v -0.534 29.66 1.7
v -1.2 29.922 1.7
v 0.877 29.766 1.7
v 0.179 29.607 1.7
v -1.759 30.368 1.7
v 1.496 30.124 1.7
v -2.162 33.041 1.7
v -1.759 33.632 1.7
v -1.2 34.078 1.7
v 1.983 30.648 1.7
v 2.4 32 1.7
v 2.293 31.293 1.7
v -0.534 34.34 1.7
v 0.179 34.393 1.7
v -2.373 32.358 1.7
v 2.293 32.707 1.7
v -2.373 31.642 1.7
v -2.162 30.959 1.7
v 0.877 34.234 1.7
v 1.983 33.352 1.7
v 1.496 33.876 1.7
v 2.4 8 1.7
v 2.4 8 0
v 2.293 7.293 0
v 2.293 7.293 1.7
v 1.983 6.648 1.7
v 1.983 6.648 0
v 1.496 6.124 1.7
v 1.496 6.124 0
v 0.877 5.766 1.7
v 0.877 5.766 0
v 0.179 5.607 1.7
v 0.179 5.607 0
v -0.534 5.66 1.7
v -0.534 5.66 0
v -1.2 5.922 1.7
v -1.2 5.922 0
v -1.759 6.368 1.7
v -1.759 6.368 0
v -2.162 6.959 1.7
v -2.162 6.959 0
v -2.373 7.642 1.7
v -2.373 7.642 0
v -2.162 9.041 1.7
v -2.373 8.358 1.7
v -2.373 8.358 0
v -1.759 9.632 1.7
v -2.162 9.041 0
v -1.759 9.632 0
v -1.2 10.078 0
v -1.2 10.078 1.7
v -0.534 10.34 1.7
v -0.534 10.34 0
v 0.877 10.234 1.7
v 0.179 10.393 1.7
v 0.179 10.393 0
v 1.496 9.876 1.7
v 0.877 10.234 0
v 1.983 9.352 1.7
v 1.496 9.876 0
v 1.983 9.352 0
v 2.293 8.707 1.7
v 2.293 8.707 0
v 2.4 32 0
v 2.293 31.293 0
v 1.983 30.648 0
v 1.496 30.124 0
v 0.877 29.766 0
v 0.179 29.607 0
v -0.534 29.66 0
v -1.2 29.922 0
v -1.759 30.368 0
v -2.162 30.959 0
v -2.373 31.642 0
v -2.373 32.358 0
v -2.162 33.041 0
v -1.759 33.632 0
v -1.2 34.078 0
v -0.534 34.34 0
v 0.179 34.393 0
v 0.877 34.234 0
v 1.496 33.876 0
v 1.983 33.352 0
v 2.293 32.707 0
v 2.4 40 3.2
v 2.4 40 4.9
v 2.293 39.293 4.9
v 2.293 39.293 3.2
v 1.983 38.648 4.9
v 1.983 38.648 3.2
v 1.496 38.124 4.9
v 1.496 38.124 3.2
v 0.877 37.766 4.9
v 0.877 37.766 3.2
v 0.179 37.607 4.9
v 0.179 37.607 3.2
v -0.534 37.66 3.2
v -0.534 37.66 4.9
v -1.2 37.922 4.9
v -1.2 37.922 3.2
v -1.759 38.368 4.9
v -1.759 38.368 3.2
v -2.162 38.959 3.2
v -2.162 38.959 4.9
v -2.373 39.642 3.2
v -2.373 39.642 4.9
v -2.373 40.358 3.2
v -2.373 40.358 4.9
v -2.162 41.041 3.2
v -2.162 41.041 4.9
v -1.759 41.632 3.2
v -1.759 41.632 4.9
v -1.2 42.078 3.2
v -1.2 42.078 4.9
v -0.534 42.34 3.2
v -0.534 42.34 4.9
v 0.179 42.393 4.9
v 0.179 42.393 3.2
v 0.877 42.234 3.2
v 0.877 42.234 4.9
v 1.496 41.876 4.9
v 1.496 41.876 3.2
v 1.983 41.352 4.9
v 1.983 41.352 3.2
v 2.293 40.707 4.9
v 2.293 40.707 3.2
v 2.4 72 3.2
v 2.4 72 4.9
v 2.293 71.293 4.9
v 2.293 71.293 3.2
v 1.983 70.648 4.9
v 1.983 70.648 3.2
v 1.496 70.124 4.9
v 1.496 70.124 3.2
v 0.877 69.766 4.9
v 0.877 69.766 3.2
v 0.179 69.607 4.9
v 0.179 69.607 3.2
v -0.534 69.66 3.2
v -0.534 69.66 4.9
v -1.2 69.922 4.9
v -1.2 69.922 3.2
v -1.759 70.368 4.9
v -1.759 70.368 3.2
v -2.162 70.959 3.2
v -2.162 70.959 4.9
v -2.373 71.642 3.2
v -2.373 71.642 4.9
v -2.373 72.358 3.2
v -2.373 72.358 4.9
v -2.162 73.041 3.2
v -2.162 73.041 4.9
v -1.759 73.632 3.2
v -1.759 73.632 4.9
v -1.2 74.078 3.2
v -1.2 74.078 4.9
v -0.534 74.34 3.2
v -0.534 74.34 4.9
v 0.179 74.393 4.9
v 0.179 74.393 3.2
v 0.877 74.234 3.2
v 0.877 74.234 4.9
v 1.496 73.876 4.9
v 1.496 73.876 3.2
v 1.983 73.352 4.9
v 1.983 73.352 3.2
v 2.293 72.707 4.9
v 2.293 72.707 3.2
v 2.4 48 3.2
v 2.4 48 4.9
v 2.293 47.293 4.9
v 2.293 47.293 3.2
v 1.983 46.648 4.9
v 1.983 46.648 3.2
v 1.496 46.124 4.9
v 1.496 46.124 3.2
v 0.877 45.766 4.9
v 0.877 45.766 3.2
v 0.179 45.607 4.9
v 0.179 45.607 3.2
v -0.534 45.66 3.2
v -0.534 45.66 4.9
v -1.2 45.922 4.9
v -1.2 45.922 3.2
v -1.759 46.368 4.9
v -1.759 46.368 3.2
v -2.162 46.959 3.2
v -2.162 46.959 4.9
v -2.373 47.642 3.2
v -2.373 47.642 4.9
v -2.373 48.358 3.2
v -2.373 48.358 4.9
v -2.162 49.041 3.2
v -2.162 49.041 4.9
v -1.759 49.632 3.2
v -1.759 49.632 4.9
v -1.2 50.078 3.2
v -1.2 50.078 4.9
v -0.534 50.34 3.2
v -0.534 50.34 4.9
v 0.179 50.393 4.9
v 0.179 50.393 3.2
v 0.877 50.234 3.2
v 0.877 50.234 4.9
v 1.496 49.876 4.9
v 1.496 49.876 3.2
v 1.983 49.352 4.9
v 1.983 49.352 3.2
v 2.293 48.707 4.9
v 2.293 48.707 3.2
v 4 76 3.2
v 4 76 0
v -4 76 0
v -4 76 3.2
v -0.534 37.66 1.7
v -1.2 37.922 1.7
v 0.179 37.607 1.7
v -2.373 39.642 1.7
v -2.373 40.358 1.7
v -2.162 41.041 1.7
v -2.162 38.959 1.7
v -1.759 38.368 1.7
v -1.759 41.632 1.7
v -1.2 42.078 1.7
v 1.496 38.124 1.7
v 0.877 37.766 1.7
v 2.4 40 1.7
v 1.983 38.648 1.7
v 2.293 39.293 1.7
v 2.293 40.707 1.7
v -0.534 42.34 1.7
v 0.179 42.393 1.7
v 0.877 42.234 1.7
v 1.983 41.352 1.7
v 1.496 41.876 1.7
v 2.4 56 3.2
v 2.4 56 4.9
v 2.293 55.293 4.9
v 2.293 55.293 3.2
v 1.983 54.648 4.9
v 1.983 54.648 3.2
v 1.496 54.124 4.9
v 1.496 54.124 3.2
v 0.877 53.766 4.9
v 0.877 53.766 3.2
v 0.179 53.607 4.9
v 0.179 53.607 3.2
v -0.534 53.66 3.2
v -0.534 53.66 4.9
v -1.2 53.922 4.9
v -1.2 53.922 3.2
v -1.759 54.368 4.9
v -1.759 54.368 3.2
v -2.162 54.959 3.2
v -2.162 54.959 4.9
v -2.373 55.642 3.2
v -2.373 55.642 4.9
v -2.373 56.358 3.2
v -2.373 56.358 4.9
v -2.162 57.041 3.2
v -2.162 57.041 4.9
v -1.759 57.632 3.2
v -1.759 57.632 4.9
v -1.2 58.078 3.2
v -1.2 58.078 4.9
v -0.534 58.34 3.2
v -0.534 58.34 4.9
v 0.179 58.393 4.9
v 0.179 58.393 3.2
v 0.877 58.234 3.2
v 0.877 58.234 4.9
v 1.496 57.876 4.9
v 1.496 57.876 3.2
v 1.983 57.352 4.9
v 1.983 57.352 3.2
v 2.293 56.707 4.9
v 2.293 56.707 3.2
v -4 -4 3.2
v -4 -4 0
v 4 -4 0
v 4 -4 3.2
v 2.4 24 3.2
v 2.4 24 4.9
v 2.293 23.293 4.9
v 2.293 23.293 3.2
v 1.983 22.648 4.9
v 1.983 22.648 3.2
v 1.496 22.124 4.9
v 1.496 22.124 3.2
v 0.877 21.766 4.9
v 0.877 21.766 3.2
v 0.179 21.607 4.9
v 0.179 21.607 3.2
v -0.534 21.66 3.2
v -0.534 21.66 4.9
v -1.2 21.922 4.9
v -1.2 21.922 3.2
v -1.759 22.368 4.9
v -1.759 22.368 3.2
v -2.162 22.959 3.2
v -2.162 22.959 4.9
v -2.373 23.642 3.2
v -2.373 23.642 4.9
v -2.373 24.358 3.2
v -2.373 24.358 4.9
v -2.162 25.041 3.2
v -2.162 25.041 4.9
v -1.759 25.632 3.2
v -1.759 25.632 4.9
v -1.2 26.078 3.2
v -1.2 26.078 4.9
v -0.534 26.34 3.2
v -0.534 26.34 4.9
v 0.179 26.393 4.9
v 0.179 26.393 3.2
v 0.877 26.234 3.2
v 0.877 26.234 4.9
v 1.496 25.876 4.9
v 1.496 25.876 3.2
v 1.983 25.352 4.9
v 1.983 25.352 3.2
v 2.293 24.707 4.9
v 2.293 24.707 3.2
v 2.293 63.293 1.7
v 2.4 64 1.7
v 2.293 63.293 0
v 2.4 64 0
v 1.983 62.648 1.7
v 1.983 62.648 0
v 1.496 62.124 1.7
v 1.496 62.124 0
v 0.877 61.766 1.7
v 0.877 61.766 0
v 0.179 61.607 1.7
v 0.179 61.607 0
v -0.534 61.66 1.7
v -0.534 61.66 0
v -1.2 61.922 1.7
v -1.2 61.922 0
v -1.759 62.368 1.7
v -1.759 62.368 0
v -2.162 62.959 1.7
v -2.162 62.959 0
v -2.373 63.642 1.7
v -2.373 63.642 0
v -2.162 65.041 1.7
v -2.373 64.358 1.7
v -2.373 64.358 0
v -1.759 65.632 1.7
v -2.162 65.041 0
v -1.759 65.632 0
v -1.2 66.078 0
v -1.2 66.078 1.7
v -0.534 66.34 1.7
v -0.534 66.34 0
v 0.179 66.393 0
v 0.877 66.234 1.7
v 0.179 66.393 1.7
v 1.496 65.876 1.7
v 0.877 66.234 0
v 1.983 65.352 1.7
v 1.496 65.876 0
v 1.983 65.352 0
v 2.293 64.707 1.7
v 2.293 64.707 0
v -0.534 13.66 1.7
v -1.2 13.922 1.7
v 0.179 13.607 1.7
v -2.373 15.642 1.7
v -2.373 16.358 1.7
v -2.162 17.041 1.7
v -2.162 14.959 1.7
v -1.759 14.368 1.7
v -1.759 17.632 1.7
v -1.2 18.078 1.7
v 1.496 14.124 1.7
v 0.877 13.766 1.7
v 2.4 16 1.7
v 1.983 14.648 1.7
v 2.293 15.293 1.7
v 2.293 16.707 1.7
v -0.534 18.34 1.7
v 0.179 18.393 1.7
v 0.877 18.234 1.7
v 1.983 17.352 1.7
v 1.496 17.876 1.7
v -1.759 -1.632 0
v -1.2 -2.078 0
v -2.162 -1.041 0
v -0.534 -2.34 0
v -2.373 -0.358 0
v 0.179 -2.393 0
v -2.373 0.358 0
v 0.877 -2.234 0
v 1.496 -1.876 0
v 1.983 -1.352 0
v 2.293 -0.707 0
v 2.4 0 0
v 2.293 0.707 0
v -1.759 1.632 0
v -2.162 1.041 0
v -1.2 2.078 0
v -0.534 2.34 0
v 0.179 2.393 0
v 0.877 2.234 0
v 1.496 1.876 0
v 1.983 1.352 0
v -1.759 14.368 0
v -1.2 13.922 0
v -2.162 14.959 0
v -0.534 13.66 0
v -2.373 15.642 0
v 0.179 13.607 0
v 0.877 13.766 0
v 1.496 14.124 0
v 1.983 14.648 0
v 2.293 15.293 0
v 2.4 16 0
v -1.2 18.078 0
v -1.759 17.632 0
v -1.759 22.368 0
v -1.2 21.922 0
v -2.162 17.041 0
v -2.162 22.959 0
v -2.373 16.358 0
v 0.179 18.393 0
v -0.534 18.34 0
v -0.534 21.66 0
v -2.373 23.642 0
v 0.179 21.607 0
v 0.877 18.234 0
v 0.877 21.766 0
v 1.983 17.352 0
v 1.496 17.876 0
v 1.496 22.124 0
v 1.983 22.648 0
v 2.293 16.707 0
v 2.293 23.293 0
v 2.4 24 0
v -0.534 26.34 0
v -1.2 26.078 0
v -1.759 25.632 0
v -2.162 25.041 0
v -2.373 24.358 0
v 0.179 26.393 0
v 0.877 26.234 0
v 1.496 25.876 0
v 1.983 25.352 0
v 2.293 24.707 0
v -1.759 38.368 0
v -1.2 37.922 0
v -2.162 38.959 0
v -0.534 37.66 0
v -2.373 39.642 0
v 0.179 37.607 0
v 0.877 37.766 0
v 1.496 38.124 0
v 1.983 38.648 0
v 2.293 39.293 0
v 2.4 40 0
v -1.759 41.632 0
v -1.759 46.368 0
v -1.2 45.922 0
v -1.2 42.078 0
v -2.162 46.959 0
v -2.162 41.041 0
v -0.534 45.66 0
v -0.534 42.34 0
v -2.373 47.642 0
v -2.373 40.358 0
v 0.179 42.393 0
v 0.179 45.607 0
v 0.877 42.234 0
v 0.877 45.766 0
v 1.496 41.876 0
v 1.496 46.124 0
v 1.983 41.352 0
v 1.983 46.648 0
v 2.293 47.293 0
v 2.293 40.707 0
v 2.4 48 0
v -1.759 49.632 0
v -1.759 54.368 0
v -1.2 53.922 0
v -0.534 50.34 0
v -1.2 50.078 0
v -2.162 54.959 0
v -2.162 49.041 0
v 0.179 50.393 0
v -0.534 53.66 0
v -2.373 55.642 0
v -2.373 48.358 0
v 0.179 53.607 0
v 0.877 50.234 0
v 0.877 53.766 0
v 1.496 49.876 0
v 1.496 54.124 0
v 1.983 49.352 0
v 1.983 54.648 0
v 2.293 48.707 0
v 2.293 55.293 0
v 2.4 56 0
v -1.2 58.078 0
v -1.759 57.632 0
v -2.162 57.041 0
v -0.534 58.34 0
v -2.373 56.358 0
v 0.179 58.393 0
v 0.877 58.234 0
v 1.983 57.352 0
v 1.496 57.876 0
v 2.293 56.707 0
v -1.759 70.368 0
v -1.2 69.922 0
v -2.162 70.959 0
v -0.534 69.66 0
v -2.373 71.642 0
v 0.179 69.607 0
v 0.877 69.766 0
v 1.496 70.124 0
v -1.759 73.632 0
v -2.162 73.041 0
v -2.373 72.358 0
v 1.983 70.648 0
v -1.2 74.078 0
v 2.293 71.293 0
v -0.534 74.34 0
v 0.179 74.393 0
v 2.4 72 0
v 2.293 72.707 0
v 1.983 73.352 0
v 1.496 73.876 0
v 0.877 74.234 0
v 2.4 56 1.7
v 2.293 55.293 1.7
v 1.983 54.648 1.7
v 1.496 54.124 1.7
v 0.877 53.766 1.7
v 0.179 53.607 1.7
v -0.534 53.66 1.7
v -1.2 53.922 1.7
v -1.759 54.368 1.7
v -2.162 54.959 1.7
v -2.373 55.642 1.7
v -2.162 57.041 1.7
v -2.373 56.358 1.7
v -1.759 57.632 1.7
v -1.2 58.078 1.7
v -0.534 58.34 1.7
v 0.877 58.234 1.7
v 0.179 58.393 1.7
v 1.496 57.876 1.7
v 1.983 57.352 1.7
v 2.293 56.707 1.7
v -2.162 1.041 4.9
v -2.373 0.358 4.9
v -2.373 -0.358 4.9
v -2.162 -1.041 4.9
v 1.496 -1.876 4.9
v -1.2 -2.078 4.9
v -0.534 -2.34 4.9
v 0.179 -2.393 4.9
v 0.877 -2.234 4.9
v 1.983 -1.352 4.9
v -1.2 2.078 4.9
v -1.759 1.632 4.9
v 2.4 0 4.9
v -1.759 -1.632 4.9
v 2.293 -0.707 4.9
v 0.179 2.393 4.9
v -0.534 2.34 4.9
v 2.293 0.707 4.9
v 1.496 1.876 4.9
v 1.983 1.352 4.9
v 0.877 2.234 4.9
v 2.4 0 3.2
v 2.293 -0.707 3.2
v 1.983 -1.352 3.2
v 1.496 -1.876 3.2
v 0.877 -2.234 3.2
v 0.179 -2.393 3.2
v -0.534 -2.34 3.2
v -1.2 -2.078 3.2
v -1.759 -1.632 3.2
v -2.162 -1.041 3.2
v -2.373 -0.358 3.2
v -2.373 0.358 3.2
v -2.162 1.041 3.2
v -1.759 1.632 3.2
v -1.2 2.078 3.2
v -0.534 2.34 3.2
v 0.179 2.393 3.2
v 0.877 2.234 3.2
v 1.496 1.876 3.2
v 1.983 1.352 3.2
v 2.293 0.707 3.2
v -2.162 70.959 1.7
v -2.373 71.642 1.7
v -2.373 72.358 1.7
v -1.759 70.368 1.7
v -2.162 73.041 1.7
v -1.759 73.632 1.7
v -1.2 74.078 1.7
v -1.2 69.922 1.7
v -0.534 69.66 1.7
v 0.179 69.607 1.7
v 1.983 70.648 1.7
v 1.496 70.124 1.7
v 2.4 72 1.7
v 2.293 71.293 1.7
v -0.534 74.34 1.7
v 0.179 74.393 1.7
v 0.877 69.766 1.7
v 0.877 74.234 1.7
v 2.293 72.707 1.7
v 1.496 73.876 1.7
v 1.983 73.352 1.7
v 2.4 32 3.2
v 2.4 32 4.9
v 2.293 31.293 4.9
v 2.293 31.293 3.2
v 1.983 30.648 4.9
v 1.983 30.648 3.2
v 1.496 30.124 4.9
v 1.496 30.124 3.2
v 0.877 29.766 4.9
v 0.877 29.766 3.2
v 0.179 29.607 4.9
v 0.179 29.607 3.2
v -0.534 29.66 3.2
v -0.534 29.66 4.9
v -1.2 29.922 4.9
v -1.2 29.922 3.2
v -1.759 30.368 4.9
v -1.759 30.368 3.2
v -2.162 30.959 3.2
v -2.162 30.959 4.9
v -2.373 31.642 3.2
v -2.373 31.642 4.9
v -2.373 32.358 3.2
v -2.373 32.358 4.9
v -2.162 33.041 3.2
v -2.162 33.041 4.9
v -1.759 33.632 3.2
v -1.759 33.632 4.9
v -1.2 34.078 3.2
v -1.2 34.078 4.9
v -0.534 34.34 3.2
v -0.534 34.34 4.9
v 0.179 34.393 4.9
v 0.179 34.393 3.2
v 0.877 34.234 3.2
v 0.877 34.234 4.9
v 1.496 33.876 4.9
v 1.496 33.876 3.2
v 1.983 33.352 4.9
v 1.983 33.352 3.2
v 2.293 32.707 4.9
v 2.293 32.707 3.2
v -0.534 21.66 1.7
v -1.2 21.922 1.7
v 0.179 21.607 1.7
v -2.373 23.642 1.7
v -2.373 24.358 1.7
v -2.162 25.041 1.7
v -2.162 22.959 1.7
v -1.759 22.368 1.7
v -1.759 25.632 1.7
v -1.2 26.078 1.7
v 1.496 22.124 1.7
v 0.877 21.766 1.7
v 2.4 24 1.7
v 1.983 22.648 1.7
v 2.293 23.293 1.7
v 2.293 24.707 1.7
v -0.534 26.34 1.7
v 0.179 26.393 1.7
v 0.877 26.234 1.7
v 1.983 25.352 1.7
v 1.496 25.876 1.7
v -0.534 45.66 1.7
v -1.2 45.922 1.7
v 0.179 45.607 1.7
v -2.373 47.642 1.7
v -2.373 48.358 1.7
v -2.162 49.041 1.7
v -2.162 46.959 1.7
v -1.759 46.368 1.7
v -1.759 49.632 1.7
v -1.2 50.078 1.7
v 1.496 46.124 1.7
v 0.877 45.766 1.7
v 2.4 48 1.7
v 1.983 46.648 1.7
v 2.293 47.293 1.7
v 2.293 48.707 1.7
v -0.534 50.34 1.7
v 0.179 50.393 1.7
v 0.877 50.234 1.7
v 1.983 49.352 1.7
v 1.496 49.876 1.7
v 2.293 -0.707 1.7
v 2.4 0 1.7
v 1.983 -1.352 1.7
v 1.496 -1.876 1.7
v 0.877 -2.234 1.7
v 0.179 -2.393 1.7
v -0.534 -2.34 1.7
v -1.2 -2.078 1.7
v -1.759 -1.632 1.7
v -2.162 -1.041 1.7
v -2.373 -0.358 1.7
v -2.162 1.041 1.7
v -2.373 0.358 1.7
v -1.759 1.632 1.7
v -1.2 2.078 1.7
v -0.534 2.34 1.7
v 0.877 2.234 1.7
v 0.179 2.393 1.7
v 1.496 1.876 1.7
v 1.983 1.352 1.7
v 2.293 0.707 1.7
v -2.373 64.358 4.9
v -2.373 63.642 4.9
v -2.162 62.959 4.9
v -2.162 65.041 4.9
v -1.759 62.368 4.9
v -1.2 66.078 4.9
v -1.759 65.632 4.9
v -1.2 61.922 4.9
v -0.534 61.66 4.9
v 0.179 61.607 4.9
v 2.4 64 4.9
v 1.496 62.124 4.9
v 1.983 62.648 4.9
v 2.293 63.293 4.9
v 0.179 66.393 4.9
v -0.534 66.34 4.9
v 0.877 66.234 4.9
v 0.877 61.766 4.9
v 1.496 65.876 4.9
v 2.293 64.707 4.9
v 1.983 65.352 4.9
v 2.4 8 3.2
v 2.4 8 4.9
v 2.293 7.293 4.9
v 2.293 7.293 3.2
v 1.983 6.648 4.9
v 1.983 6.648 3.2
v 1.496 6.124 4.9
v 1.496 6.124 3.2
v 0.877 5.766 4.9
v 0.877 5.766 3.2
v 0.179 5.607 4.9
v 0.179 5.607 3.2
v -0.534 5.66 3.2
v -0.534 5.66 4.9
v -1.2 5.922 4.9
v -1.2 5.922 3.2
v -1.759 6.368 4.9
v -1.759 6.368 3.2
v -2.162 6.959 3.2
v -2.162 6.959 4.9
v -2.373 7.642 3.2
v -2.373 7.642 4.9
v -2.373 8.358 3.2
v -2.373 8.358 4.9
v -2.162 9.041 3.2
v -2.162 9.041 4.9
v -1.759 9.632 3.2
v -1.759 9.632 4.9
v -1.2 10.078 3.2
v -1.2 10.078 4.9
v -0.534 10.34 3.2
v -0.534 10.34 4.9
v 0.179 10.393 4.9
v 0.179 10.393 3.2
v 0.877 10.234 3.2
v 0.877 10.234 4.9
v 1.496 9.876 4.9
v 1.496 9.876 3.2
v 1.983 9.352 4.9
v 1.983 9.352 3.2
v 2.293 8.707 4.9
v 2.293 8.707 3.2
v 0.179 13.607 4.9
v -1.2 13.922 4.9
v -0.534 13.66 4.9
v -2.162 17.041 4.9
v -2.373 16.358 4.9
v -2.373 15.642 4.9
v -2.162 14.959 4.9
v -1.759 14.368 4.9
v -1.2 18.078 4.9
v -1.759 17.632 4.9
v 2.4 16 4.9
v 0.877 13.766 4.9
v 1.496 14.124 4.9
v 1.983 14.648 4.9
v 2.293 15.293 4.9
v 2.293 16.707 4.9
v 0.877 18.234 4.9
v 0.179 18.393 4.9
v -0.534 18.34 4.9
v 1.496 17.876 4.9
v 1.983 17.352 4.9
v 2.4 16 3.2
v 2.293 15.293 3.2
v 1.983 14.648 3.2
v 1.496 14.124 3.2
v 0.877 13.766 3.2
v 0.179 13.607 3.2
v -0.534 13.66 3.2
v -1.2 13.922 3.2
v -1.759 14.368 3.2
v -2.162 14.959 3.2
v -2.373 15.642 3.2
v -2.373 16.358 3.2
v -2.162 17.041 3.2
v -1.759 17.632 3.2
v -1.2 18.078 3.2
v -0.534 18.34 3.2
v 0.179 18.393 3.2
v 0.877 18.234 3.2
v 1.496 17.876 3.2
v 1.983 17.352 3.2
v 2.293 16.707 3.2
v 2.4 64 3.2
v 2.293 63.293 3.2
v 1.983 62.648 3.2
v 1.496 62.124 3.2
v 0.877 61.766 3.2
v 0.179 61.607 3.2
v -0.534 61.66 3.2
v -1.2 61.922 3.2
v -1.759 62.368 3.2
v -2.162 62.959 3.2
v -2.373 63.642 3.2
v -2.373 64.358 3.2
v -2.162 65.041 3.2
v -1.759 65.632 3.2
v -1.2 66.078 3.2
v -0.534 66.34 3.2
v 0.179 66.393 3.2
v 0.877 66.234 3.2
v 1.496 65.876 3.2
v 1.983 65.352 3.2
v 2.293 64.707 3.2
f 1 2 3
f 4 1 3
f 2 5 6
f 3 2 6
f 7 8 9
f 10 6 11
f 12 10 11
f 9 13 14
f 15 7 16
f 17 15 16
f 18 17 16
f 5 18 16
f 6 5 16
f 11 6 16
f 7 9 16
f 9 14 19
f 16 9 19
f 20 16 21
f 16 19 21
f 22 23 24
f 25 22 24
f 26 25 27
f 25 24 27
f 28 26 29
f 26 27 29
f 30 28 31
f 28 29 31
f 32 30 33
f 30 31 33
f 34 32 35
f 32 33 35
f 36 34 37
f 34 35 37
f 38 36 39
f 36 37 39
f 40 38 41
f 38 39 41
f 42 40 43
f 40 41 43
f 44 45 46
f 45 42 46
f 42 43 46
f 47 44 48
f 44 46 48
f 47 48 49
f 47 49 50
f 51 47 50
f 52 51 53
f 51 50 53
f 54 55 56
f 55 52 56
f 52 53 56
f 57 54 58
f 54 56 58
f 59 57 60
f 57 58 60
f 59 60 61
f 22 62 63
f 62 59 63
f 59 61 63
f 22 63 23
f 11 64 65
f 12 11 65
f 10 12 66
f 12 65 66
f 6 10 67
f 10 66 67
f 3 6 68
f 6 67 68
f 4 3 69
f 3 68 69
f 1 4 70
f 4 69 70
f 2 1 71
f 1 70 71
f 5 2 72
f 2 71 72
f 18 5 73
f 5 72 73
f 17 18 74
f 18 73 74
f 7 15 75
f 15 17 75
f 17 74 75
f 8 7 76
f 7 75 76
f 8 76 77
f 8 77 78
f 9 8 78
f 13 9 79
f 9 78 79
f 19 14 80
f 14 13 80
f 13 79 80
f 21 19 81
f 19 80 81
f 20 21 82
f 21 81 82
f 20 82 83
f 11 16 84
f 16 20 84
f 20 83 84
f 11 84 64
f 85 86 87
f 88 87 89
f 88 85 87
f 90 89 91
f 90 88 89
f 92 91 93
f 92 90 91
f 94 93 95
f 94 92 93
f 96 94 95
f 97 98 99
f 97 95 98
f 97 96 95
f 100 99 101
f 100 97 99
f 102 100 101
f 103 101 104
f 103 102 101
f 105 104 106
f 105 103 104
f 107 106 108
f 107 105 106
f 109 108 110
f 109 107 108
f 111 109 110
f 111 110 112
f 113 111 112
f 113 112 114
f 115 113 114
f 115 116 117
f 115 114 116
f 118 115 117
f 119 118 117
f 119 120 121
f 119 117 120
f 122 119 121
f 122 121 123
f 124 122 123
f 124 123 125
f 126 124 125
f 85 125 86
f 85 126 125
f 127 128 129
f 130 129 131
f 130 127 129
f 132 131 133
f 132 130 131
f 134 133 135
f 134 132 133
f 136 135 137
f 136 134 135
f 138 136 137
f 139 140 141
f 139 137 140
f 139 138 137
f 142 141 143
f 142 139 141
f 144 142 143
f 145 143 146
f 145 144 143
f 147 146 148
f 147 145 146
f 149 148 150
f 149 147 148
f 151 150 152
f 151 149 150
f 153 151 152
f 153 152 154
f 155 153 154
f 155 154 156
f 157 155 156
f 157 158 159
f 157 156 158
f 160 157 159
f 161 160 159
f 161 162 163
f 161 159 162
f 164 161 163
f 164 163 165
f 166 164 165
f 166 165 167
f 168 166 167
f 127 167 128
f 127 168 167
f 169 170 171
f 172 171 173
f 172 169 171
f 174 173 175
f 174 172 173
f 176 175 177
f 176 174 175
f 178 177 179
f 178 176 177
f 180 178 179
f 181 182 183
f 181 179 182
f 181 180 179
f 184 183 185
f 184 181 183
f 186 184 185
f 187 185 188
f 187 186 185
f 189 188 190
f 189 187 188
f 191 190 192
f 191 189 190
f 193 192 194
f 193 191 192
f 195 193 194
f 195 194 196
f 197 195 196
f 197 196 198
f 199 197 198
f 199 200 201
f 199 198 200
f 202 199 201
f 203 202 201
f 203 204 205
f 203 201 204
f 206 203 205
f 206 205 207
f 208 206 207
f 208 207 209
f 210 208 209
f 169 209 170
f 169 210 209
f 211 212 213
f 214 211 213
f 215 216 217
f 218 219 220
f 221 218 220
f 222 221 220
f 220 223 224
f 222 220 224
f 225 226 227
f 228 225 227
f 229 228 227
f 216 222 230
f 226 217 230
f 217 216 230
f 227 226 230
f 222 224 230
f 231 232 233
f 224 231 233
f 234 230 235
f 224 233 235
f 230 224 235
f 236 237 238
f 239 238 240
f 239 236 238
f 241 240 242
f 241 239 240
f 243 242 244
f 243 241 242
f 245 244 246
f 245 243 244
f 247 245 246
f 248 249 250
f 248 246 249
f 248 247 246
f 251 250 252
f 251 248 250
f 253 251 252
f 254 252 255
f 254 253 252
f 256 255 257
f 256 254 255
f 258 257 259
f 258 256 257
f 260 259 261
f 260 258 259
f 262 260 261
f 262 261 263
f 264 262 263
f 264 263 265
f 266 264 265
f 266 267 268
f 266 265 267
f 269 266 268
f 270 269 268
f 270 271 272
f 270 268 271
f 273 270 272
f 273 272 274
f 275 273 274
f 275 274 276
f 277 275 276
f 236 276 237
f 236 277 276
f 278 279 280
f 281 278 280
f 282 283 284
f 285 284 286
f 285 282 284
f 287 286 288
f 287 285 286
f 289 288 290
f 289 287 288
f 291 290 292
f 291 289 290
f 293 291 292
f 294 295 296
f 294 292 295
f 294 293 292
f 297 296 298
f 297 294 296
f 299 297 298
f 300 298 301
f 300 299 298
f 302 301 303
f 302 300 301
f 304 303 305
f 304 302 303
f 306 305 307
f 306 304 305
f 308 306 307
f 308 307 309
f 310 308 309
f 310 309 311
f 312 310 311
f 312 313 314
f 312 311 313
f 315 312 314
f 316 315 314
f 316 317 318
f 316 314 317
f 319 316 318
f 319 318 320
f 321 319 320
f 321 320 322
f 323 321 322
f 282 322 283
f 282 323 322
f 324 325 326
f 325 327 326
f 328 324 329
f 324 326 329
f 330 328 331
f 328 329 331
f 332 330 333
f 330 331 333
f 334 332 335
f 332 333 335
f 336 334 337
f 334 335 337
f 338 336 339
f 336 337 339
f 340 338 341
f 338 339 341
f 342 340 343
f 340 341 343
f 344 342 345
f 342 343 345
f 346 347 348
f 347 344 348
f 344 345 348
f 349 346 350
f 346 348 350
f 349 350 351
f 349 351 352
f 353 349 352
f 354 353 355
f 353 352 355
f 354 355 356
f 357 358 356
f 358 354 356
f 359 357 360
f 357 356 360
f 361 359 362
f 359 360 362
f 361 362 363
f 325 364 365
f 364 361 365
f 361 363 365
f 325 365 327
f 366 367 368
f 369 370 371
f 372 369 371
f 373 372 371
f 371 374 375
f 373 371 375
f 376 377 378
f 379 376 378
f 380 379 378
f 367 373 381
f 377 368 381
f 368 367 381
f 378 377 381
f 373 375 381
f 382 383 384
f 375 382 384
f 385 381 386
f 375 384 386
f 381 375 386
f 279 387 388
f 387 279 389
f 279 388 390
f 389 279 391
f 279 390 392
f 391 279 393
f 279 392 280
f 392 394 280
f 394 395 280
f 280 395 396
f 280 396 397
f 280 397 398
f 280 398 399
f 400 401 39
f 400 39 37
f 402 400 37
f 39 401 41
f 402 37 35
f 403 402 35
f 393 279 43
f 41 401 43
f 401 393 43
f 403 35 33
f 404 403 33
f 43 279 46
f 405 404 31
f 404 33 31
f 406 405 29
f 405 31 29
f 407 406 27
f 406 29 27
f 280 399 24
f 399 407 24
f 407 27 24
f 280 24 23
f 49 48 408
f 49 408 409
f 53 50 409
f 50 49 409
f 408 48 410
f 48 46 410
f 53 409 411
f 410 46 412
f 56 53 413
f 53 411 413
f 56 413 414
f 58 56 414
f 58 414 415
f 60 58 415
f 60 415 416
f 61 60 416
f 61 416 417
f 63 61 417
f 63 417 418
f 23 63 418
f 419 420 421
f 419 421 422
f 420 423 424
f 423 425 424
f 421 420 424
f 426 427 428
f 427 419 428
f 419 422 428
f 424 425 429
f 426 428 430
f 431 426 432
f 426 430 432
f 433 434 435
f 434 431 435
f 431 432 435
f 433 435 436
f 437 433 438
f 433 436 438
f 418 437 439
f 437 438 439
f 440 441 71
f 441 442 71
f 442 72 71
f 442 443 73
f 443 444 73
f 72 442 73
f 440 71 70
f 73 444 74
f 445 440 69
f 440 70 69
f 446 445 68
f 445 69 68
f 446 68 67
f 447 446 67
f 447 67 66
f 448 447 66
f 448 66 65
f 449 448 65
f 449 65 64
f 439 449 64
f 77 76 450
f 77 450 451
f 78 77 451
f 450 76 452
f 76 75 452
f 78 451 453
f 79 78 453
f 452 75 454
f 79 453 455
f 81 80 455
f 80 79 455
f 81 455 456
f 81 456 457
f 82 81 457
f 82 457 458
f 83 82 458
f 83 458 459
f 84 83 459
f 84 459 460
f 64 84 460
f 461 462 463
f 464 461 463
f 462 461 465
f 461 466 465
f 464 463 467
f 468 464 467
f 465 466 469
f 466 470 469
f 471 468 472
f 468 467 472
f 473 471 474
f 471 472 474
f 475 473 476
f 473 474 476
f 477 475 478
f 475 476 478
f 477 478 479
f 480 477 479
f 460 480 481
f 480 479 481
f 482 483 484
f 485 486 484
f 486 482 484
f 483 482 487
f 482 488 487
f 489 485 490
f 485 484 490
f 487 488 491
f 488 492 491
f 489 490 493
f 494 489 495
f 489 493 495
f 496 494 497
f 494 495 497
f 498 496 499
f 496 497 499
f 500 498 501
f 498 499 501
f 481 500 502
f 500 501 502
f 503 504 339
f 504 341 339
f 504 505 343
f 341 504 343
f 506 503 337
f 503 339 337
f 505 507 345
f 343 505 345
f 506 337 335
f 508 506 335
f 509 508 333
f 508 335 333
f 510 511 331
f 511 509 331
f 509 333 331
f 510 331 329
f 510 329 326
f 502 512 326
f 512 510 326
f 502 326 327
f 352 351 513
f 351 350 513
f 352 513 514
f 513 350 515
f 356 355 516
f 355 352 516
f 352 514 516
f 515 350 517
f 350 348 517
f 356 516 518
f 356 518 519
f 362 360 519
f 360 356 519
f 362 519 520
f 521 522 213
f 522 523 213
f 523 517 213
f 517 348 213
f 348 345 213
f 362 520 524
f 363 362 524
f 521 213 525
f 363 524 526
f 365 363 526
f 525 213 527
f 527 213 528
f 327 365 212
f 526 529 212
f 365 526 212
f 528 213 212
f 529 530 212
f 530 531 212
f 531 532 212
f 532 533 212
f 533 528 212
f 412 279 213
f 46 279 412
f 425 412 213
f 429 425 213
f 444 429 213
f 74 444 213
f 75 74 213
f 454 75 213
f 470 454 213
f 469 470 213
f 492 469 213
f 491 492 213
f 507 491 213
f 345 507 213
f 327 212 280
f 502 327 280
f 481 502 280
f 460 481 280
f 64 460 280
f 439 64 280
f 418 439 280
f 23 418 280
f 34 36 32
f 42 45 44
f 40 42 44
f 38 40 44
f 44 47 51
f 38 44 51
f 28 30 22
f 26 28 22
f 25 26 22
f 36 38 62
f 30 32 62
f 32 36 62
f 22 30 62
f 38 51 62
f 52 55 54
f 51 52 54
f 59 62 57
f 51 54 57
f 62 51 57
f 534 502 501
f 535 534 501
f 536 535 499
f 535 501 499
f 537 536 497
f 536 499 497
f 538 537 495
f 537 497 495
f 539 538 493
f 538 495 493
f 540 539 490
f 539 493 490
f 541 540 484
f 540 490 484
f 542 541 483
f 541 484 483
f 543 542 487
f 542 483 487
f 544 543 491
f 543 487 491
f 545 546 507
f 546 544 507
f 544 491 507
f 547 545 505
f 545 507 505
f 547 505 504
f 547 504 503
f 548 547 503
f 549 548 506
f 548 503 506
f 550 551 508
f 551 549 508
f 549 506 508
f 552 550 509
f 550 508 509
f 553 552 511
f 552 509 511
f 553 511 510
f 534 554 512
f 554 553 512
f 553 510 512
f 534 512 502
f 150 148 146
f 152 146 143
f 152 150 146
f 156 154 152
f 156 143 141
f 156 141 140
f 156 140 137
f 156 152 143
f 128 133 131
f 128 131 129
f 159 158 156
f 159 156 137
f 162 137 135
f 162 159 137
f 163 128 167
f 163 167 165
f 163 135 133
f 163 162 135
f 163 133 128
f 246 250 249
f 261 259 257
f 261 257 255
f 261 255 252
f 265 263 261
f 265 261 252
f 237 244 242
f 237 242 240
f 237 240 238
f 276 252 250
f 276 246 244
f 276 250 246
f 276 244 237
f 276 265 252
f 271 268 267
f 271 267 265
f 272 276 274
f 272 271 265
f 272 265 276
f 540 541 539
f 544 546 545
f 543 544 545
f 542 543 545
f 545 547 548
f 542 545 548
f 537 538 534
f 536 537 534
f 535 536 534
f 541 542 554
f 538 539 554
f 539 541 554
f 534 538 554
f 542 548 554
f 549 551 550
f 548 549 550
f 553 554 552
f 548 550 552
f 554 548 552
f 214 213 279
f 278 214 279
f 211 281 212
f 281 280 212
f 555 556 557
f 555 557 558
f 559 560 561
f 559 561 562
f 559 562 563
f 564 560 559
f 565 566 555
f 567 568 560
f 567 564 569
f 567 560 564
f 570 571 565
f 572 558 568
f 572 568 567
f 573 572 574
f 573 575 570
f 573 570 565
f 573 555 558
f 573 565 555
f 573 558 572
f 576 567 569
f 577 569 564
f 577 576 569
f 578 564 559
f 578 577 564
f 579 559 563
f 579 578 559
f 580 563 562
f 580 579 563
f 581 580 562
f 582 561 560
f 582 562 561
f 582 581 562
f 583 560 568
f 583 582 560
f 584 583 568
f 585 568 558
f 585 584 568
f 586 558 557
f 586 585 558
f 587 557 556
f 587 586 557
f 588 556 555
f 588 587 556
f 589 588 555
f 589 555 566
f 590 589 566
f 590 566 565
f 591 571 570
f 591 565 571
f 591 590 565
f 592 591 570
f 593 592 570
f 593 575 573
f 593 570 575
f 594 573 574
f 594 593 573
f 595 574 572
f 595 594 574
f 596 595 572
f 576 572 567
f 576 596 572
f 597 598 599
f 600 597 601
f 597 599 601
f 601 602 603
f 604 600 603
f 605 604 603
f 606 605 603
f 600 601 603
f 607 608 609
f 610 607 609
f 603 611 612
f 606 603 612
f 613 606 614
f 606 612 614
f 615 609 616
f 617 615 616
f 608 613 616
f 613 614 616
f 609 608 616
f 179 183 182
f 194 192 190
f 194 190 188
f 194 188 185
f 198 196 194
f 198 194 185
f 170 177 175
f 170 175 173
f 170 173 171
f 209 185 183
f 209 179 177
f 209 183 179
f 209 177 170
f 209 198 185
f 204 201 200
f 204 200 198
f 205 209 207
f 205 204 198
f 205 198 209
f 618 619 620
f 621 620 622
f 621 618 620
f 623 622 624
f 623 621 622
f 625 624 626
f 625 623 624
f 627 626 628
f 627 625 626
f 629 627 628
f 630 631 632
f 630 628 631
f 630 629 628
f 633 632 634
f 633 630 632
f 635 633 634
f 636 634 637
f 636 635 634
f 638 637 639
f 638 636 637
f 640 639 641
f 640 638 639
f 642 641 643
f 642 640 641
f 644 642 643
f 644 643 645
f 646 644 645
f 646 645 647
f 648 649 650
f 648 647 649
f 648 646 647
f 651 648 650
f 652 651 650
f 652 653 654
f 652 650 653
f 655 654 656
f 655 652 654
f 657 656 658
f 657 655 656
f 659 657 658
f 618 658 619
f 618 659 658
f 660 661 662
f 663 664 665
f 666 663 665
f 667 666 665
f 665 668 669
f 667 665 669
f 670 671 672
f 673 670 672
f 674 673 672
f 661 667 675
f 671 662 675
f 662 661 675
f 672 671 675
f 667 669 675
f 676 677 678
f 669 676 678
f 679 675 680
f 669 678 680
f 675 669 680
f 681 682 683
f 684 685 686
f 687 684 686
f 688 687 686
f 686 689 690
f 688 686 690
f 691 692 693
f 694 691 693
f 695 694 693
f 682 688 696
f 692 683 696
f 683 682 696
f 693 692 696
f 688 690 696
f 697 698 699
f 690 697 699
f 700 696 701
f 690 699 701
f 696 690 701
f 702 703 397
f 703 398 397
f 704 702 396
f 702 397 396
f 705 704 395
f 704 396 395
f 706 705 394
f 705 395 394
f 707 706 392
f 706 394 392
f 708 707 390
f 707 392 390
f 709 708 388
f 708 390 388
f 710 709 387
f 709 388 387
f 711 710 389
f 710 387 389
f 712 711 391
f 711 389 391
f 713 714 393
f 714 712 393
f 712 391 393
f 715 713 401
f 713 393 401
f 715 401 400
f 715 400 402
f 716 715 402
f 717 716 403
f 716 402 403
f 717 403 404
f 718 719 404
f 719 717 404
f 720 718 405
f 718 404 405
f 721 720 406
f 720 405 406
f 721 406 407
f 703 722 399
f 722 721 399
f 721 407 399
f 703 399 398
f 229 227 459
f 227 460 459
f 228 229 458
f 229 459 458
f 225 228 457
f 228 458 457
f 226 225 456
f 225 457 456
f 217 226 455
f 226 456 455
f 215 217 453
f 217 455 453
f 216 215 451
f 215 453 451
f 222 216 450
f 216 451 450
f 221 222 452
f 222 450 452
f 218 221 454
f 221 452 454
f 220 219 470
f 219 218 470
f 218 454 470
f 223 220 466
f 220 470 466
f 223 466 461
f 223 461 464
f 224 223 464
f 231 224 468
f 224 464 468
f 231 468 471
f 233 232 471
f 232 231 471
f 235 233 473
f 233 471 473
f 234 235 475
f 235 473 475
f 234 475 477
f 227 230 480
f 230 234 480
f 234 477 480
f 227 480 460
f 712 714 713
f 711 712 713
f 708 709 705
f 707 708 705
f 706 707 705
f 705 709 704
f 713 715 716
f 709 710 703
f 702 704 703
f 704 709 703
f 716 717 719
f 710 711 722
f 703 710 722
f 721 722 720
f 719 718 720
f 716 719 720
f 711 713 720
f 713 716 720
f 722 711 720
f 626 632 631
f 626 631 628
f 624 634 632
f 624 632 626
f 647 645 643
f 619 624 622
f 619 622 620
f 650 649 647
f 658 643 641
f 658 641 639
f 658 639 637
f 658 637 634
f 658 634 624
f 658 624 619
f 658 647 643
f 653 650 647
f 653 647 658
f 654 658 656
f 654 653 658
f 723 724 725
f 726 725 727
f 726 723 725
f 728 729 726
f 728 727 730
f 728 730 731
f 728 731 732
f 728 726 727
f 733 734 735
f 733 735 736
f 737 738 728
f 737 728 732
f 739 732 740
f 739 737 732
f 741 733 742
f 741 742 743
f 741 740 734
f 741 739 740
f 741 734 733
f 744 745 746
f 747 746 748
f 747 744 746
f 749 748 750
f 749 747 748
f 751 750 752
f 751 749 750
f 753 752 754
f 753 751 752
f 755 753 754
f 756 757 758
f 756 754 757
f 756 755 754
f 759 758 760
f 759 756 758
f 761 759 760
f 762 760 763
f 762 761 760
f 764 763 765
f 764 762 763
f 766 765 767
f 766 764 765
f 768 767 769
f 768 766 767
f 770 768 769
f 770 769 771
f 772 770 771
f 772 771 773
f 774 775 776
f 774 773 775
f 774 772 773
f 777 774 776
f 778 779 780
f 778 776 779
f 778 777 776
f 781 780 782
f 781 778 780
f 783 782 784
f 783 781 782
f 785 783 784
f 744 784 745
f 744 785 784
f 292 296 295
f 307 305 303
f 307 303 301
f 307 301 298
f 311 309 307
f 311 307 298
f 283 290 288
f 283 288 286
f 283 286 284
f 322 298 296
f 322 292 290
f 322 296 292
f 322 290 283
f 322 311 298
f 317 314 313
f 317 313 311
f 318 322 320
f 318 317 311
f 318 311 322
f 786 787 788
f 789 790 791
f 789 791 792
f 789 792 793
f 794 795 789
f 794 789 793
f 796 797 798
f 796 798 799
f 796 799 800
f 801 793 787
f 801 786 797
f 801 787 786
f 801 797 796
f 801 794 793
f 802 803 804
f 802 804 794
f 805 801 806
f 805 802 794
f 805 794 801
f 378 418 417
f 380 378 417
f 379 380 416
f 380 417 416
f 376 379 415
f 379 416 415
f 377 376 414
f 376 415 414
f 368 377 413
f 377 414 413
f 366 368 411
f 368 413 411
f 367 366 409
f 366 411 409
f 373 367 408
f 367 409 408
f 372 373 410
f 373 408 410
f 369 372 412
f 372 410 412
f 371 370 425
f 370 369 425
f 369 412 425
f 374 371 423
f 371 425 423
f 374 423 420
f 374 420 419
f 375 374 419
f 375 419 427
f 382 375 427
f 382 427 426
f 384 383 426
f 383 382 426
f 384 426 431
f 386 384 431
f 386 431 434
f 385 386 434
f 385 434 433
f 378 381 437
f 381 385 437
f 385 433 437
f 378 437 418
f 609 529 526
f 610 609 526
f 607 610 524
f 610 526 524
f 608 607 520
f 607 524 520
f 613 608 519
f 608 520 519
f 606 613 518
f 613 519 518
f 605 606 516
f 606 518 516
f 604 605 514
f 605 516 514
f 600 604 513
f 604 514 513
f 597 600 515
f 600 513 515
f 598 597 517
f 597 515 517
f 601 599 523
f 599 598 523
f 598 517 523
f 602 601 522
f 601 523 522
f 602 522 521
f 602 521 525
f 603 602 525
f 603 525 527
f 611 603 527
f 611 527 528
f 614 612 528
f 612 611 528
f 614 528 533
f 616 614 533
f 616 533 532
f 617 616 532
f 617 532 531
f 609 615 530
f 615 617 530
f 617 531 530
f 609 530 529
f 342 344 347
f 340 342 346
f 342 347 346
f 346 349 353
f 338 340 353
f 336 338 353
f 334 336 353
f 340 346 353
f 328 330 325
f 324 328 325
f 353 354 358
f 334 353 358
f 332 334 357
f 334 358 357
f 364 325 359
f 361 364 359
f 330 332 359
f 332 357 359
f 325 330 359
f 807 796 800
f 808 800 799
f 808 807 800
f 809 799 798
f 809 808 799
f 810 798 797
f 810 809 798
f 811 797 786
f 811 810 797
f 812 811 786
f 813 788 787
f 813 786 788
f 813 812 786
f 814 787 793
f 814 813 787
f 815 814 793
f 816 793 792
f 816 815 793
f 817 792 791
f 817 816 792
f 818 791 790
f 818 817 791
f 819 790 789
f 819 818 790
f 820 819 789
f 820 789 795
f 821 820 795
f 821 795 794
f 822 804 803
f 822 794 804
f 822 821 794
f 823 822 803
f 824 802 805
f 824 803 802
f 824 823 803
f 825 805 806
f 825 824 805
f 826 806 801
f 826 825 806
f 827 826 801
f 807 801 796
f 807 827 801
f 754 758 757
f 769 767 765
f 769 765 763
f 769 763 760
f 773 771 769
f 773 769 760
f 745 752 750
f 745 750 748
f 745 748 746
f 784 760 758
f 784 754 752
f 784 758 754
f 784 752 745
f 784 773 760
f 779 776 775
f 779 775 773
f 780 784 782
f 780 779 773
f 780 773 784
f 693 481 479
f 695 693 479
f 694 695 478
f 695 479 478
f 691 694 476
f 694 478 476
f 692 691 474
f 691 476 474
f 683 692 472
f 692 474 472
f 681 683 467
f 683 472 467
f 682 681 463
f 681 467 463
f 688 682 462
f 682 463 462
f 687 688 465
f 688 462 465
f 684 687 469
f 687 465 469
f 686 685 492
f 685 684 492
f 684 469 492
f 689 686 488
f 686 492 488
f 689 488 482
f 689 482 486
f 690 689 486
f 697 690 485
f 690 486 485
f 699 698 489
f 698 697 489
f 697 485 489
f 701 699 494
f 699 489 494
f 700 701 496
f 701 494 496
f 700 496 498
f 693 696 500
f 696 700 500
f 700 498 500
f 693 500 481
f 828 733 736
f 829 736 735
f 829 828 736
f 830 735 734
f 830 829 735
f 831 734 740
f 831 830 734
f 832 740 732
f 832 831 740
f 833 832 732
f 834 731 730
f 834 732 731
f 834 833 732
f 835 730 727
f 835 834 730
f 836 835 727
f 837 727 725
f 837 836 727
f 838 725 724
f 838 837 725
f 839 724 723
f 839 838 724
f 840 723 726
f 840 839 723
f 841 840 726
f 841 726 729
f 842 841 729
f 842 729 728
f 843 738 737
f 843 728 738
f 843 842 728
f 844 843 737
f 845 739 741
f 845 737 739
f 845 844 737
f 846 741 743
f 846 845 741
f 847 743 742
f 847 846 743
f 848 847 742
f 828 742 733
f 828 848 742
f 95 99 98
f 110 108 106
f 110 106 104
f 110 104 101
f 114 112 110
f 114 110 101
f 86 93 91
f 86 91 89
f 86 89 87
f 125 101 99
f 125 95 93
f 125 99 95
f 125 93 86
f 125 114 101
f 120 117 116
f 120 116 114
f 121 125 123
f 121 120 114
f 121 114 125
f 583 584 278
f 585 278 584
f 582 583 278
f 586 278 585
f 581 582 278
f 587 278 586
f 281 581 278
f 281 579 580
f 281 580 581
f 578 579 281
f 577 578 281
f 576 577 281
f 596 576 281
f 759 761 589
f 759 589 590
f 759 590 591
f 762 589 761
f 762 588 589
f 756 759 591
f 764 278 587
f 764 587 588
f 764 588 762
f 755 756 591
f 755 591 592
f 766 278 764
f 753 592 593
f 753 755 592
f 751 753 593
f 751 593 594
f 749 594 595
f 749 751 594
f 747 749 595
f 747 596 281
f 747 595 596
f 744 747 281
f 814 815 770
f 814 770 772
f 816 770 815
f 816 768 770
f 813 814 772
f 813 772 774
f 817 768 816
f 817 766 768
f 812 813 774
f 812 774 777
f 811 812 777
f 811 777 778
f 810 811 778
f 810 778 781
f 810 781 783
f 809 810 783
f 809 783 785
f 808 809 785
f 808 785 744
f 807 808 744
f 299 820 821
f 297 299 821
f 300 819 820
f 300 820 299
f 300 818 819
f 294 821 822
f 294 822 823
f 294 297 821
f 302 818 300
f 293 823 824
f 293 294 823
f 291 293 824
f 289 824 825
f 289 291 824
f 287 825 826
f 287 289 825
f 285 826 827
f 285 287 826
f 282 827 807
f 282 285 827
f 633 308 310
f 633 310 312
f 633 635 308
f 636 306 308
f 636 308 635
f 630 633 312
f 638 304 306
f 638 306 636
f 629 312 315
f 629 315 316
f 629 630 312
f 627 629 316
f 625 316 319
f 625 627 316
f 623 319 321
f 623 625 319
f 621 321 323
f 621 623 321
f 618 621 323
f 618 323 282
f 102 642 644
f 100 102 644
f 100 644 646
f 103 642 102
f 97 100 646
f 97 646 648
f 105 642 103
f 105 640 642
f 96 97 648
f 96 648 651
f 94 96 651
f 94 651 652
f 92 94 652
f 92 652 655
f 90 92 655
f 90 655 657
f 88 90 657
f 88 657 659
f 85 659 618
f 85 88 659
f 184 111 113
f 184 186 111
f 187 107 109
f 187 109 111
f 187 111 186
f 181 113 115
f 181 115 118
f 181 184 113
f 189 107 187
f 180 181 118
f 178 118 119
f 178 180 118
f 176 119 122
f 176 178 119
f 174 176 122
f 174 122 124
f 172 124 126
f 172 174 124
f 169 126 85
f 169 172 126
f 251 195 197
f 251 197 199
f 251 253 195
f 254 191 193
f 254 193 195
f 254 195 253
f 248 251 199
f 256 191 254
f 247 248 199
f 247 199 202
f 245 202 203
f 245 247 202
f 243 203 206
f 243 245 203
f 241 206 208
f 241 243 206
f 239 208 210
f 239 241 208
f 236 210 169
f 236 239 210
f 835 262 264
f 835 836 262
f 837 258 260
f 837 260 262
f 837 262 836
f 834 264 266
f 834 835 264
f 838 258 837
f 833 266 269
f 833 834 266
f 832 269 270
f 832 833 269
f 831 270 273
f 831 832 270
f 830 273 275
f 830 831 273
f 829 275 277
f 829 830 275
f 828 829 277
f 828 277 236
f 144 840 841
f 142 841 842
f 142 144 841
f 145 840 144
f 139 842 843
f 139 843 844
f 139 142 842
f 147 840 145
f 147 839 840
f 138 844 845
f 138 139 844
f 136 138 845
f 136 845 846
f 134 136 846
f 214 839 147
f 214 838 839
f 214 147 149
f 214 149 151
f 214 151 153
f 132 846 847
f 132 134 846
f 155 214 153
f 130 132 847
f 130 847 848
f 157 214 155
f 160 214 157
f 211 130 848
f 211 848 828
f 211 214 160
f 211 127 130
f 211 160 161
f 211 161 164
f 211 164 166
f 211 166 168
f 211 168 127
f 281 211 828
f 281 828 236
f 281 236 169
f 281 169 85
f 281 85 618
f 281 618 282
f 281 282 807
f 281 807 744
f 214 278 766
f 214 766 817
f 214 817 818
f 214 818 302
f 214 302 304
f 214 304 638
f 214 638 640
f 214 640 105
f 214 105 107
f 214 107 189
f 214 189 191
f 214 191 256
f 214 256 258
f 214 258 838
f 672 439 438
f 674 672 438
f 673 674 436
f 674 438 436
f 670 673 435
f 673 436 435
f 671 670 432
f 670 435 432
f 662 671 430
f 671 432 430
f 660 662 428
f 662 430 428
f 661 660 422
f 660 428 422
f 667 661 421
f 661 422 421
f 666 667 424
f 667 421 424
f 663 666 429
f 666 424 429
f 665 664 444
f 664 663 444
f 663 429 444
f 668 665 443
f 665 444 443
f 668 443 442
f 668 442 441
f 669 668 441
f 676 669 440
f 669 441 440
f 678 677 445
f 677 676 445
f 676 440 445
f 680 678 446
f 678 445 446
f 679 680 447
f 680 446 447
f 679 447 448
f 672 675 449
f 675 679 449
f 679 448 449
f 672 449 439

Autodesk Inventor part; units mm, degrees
ref_plane "YZ Plane" through (0, 0, 0) normal (1, 0, 0) x (0, 1, 0)
ref_plane "XZ Plane" through (0, 0, 0) normal (0, 1, 0) x (-1, 0, 0)
ref_plane "XY Plane" through (0, 0, 0) normal (0, 0, 1) x (1, 0, 0)
sketch "Sketch1" plane through (0, 0, 0) normal (0, 0, 1) x (1, 0, 0)
  line L0 (-4, -4) -> (4, -4)
  line L1 (4, -4) -> (4, 4)
  line L2 (4, 4) -> (-4, 4)
  line L3 (-4, 4) -> (-4, -4)
  line L4 (-4, -4) -> (4, 4) construction
  line L5 (4, -4) -> (-4, 4) construction
  circle A0 centre (0, 0) radius 2.4
  dimension "d0" = 8
  dimension "d1" = 8
  dimension "d2" = 4.8
extrude "Extrusion1" add sketch "Sketch1" along normal blind 3.2 contours L3 L2 L1 L0 | A0
extrude "Extrusion2" add sketch "Sketch1" along normal blind 4.9 contours A0
extrude "Extrusion3" cut sketch "Sketch1" along normal blind 1.7 contours A0
pattern_linear "Rectangular Pattern1" count 10 spacing 8 along (0, 1, 0) of "Extrusion1", "Extrusion2", "Extrusion3"
equation "\"d11\" = d0"
equation "\"d24\" = d0"
properties part number "LEGO Plate 1x10"
